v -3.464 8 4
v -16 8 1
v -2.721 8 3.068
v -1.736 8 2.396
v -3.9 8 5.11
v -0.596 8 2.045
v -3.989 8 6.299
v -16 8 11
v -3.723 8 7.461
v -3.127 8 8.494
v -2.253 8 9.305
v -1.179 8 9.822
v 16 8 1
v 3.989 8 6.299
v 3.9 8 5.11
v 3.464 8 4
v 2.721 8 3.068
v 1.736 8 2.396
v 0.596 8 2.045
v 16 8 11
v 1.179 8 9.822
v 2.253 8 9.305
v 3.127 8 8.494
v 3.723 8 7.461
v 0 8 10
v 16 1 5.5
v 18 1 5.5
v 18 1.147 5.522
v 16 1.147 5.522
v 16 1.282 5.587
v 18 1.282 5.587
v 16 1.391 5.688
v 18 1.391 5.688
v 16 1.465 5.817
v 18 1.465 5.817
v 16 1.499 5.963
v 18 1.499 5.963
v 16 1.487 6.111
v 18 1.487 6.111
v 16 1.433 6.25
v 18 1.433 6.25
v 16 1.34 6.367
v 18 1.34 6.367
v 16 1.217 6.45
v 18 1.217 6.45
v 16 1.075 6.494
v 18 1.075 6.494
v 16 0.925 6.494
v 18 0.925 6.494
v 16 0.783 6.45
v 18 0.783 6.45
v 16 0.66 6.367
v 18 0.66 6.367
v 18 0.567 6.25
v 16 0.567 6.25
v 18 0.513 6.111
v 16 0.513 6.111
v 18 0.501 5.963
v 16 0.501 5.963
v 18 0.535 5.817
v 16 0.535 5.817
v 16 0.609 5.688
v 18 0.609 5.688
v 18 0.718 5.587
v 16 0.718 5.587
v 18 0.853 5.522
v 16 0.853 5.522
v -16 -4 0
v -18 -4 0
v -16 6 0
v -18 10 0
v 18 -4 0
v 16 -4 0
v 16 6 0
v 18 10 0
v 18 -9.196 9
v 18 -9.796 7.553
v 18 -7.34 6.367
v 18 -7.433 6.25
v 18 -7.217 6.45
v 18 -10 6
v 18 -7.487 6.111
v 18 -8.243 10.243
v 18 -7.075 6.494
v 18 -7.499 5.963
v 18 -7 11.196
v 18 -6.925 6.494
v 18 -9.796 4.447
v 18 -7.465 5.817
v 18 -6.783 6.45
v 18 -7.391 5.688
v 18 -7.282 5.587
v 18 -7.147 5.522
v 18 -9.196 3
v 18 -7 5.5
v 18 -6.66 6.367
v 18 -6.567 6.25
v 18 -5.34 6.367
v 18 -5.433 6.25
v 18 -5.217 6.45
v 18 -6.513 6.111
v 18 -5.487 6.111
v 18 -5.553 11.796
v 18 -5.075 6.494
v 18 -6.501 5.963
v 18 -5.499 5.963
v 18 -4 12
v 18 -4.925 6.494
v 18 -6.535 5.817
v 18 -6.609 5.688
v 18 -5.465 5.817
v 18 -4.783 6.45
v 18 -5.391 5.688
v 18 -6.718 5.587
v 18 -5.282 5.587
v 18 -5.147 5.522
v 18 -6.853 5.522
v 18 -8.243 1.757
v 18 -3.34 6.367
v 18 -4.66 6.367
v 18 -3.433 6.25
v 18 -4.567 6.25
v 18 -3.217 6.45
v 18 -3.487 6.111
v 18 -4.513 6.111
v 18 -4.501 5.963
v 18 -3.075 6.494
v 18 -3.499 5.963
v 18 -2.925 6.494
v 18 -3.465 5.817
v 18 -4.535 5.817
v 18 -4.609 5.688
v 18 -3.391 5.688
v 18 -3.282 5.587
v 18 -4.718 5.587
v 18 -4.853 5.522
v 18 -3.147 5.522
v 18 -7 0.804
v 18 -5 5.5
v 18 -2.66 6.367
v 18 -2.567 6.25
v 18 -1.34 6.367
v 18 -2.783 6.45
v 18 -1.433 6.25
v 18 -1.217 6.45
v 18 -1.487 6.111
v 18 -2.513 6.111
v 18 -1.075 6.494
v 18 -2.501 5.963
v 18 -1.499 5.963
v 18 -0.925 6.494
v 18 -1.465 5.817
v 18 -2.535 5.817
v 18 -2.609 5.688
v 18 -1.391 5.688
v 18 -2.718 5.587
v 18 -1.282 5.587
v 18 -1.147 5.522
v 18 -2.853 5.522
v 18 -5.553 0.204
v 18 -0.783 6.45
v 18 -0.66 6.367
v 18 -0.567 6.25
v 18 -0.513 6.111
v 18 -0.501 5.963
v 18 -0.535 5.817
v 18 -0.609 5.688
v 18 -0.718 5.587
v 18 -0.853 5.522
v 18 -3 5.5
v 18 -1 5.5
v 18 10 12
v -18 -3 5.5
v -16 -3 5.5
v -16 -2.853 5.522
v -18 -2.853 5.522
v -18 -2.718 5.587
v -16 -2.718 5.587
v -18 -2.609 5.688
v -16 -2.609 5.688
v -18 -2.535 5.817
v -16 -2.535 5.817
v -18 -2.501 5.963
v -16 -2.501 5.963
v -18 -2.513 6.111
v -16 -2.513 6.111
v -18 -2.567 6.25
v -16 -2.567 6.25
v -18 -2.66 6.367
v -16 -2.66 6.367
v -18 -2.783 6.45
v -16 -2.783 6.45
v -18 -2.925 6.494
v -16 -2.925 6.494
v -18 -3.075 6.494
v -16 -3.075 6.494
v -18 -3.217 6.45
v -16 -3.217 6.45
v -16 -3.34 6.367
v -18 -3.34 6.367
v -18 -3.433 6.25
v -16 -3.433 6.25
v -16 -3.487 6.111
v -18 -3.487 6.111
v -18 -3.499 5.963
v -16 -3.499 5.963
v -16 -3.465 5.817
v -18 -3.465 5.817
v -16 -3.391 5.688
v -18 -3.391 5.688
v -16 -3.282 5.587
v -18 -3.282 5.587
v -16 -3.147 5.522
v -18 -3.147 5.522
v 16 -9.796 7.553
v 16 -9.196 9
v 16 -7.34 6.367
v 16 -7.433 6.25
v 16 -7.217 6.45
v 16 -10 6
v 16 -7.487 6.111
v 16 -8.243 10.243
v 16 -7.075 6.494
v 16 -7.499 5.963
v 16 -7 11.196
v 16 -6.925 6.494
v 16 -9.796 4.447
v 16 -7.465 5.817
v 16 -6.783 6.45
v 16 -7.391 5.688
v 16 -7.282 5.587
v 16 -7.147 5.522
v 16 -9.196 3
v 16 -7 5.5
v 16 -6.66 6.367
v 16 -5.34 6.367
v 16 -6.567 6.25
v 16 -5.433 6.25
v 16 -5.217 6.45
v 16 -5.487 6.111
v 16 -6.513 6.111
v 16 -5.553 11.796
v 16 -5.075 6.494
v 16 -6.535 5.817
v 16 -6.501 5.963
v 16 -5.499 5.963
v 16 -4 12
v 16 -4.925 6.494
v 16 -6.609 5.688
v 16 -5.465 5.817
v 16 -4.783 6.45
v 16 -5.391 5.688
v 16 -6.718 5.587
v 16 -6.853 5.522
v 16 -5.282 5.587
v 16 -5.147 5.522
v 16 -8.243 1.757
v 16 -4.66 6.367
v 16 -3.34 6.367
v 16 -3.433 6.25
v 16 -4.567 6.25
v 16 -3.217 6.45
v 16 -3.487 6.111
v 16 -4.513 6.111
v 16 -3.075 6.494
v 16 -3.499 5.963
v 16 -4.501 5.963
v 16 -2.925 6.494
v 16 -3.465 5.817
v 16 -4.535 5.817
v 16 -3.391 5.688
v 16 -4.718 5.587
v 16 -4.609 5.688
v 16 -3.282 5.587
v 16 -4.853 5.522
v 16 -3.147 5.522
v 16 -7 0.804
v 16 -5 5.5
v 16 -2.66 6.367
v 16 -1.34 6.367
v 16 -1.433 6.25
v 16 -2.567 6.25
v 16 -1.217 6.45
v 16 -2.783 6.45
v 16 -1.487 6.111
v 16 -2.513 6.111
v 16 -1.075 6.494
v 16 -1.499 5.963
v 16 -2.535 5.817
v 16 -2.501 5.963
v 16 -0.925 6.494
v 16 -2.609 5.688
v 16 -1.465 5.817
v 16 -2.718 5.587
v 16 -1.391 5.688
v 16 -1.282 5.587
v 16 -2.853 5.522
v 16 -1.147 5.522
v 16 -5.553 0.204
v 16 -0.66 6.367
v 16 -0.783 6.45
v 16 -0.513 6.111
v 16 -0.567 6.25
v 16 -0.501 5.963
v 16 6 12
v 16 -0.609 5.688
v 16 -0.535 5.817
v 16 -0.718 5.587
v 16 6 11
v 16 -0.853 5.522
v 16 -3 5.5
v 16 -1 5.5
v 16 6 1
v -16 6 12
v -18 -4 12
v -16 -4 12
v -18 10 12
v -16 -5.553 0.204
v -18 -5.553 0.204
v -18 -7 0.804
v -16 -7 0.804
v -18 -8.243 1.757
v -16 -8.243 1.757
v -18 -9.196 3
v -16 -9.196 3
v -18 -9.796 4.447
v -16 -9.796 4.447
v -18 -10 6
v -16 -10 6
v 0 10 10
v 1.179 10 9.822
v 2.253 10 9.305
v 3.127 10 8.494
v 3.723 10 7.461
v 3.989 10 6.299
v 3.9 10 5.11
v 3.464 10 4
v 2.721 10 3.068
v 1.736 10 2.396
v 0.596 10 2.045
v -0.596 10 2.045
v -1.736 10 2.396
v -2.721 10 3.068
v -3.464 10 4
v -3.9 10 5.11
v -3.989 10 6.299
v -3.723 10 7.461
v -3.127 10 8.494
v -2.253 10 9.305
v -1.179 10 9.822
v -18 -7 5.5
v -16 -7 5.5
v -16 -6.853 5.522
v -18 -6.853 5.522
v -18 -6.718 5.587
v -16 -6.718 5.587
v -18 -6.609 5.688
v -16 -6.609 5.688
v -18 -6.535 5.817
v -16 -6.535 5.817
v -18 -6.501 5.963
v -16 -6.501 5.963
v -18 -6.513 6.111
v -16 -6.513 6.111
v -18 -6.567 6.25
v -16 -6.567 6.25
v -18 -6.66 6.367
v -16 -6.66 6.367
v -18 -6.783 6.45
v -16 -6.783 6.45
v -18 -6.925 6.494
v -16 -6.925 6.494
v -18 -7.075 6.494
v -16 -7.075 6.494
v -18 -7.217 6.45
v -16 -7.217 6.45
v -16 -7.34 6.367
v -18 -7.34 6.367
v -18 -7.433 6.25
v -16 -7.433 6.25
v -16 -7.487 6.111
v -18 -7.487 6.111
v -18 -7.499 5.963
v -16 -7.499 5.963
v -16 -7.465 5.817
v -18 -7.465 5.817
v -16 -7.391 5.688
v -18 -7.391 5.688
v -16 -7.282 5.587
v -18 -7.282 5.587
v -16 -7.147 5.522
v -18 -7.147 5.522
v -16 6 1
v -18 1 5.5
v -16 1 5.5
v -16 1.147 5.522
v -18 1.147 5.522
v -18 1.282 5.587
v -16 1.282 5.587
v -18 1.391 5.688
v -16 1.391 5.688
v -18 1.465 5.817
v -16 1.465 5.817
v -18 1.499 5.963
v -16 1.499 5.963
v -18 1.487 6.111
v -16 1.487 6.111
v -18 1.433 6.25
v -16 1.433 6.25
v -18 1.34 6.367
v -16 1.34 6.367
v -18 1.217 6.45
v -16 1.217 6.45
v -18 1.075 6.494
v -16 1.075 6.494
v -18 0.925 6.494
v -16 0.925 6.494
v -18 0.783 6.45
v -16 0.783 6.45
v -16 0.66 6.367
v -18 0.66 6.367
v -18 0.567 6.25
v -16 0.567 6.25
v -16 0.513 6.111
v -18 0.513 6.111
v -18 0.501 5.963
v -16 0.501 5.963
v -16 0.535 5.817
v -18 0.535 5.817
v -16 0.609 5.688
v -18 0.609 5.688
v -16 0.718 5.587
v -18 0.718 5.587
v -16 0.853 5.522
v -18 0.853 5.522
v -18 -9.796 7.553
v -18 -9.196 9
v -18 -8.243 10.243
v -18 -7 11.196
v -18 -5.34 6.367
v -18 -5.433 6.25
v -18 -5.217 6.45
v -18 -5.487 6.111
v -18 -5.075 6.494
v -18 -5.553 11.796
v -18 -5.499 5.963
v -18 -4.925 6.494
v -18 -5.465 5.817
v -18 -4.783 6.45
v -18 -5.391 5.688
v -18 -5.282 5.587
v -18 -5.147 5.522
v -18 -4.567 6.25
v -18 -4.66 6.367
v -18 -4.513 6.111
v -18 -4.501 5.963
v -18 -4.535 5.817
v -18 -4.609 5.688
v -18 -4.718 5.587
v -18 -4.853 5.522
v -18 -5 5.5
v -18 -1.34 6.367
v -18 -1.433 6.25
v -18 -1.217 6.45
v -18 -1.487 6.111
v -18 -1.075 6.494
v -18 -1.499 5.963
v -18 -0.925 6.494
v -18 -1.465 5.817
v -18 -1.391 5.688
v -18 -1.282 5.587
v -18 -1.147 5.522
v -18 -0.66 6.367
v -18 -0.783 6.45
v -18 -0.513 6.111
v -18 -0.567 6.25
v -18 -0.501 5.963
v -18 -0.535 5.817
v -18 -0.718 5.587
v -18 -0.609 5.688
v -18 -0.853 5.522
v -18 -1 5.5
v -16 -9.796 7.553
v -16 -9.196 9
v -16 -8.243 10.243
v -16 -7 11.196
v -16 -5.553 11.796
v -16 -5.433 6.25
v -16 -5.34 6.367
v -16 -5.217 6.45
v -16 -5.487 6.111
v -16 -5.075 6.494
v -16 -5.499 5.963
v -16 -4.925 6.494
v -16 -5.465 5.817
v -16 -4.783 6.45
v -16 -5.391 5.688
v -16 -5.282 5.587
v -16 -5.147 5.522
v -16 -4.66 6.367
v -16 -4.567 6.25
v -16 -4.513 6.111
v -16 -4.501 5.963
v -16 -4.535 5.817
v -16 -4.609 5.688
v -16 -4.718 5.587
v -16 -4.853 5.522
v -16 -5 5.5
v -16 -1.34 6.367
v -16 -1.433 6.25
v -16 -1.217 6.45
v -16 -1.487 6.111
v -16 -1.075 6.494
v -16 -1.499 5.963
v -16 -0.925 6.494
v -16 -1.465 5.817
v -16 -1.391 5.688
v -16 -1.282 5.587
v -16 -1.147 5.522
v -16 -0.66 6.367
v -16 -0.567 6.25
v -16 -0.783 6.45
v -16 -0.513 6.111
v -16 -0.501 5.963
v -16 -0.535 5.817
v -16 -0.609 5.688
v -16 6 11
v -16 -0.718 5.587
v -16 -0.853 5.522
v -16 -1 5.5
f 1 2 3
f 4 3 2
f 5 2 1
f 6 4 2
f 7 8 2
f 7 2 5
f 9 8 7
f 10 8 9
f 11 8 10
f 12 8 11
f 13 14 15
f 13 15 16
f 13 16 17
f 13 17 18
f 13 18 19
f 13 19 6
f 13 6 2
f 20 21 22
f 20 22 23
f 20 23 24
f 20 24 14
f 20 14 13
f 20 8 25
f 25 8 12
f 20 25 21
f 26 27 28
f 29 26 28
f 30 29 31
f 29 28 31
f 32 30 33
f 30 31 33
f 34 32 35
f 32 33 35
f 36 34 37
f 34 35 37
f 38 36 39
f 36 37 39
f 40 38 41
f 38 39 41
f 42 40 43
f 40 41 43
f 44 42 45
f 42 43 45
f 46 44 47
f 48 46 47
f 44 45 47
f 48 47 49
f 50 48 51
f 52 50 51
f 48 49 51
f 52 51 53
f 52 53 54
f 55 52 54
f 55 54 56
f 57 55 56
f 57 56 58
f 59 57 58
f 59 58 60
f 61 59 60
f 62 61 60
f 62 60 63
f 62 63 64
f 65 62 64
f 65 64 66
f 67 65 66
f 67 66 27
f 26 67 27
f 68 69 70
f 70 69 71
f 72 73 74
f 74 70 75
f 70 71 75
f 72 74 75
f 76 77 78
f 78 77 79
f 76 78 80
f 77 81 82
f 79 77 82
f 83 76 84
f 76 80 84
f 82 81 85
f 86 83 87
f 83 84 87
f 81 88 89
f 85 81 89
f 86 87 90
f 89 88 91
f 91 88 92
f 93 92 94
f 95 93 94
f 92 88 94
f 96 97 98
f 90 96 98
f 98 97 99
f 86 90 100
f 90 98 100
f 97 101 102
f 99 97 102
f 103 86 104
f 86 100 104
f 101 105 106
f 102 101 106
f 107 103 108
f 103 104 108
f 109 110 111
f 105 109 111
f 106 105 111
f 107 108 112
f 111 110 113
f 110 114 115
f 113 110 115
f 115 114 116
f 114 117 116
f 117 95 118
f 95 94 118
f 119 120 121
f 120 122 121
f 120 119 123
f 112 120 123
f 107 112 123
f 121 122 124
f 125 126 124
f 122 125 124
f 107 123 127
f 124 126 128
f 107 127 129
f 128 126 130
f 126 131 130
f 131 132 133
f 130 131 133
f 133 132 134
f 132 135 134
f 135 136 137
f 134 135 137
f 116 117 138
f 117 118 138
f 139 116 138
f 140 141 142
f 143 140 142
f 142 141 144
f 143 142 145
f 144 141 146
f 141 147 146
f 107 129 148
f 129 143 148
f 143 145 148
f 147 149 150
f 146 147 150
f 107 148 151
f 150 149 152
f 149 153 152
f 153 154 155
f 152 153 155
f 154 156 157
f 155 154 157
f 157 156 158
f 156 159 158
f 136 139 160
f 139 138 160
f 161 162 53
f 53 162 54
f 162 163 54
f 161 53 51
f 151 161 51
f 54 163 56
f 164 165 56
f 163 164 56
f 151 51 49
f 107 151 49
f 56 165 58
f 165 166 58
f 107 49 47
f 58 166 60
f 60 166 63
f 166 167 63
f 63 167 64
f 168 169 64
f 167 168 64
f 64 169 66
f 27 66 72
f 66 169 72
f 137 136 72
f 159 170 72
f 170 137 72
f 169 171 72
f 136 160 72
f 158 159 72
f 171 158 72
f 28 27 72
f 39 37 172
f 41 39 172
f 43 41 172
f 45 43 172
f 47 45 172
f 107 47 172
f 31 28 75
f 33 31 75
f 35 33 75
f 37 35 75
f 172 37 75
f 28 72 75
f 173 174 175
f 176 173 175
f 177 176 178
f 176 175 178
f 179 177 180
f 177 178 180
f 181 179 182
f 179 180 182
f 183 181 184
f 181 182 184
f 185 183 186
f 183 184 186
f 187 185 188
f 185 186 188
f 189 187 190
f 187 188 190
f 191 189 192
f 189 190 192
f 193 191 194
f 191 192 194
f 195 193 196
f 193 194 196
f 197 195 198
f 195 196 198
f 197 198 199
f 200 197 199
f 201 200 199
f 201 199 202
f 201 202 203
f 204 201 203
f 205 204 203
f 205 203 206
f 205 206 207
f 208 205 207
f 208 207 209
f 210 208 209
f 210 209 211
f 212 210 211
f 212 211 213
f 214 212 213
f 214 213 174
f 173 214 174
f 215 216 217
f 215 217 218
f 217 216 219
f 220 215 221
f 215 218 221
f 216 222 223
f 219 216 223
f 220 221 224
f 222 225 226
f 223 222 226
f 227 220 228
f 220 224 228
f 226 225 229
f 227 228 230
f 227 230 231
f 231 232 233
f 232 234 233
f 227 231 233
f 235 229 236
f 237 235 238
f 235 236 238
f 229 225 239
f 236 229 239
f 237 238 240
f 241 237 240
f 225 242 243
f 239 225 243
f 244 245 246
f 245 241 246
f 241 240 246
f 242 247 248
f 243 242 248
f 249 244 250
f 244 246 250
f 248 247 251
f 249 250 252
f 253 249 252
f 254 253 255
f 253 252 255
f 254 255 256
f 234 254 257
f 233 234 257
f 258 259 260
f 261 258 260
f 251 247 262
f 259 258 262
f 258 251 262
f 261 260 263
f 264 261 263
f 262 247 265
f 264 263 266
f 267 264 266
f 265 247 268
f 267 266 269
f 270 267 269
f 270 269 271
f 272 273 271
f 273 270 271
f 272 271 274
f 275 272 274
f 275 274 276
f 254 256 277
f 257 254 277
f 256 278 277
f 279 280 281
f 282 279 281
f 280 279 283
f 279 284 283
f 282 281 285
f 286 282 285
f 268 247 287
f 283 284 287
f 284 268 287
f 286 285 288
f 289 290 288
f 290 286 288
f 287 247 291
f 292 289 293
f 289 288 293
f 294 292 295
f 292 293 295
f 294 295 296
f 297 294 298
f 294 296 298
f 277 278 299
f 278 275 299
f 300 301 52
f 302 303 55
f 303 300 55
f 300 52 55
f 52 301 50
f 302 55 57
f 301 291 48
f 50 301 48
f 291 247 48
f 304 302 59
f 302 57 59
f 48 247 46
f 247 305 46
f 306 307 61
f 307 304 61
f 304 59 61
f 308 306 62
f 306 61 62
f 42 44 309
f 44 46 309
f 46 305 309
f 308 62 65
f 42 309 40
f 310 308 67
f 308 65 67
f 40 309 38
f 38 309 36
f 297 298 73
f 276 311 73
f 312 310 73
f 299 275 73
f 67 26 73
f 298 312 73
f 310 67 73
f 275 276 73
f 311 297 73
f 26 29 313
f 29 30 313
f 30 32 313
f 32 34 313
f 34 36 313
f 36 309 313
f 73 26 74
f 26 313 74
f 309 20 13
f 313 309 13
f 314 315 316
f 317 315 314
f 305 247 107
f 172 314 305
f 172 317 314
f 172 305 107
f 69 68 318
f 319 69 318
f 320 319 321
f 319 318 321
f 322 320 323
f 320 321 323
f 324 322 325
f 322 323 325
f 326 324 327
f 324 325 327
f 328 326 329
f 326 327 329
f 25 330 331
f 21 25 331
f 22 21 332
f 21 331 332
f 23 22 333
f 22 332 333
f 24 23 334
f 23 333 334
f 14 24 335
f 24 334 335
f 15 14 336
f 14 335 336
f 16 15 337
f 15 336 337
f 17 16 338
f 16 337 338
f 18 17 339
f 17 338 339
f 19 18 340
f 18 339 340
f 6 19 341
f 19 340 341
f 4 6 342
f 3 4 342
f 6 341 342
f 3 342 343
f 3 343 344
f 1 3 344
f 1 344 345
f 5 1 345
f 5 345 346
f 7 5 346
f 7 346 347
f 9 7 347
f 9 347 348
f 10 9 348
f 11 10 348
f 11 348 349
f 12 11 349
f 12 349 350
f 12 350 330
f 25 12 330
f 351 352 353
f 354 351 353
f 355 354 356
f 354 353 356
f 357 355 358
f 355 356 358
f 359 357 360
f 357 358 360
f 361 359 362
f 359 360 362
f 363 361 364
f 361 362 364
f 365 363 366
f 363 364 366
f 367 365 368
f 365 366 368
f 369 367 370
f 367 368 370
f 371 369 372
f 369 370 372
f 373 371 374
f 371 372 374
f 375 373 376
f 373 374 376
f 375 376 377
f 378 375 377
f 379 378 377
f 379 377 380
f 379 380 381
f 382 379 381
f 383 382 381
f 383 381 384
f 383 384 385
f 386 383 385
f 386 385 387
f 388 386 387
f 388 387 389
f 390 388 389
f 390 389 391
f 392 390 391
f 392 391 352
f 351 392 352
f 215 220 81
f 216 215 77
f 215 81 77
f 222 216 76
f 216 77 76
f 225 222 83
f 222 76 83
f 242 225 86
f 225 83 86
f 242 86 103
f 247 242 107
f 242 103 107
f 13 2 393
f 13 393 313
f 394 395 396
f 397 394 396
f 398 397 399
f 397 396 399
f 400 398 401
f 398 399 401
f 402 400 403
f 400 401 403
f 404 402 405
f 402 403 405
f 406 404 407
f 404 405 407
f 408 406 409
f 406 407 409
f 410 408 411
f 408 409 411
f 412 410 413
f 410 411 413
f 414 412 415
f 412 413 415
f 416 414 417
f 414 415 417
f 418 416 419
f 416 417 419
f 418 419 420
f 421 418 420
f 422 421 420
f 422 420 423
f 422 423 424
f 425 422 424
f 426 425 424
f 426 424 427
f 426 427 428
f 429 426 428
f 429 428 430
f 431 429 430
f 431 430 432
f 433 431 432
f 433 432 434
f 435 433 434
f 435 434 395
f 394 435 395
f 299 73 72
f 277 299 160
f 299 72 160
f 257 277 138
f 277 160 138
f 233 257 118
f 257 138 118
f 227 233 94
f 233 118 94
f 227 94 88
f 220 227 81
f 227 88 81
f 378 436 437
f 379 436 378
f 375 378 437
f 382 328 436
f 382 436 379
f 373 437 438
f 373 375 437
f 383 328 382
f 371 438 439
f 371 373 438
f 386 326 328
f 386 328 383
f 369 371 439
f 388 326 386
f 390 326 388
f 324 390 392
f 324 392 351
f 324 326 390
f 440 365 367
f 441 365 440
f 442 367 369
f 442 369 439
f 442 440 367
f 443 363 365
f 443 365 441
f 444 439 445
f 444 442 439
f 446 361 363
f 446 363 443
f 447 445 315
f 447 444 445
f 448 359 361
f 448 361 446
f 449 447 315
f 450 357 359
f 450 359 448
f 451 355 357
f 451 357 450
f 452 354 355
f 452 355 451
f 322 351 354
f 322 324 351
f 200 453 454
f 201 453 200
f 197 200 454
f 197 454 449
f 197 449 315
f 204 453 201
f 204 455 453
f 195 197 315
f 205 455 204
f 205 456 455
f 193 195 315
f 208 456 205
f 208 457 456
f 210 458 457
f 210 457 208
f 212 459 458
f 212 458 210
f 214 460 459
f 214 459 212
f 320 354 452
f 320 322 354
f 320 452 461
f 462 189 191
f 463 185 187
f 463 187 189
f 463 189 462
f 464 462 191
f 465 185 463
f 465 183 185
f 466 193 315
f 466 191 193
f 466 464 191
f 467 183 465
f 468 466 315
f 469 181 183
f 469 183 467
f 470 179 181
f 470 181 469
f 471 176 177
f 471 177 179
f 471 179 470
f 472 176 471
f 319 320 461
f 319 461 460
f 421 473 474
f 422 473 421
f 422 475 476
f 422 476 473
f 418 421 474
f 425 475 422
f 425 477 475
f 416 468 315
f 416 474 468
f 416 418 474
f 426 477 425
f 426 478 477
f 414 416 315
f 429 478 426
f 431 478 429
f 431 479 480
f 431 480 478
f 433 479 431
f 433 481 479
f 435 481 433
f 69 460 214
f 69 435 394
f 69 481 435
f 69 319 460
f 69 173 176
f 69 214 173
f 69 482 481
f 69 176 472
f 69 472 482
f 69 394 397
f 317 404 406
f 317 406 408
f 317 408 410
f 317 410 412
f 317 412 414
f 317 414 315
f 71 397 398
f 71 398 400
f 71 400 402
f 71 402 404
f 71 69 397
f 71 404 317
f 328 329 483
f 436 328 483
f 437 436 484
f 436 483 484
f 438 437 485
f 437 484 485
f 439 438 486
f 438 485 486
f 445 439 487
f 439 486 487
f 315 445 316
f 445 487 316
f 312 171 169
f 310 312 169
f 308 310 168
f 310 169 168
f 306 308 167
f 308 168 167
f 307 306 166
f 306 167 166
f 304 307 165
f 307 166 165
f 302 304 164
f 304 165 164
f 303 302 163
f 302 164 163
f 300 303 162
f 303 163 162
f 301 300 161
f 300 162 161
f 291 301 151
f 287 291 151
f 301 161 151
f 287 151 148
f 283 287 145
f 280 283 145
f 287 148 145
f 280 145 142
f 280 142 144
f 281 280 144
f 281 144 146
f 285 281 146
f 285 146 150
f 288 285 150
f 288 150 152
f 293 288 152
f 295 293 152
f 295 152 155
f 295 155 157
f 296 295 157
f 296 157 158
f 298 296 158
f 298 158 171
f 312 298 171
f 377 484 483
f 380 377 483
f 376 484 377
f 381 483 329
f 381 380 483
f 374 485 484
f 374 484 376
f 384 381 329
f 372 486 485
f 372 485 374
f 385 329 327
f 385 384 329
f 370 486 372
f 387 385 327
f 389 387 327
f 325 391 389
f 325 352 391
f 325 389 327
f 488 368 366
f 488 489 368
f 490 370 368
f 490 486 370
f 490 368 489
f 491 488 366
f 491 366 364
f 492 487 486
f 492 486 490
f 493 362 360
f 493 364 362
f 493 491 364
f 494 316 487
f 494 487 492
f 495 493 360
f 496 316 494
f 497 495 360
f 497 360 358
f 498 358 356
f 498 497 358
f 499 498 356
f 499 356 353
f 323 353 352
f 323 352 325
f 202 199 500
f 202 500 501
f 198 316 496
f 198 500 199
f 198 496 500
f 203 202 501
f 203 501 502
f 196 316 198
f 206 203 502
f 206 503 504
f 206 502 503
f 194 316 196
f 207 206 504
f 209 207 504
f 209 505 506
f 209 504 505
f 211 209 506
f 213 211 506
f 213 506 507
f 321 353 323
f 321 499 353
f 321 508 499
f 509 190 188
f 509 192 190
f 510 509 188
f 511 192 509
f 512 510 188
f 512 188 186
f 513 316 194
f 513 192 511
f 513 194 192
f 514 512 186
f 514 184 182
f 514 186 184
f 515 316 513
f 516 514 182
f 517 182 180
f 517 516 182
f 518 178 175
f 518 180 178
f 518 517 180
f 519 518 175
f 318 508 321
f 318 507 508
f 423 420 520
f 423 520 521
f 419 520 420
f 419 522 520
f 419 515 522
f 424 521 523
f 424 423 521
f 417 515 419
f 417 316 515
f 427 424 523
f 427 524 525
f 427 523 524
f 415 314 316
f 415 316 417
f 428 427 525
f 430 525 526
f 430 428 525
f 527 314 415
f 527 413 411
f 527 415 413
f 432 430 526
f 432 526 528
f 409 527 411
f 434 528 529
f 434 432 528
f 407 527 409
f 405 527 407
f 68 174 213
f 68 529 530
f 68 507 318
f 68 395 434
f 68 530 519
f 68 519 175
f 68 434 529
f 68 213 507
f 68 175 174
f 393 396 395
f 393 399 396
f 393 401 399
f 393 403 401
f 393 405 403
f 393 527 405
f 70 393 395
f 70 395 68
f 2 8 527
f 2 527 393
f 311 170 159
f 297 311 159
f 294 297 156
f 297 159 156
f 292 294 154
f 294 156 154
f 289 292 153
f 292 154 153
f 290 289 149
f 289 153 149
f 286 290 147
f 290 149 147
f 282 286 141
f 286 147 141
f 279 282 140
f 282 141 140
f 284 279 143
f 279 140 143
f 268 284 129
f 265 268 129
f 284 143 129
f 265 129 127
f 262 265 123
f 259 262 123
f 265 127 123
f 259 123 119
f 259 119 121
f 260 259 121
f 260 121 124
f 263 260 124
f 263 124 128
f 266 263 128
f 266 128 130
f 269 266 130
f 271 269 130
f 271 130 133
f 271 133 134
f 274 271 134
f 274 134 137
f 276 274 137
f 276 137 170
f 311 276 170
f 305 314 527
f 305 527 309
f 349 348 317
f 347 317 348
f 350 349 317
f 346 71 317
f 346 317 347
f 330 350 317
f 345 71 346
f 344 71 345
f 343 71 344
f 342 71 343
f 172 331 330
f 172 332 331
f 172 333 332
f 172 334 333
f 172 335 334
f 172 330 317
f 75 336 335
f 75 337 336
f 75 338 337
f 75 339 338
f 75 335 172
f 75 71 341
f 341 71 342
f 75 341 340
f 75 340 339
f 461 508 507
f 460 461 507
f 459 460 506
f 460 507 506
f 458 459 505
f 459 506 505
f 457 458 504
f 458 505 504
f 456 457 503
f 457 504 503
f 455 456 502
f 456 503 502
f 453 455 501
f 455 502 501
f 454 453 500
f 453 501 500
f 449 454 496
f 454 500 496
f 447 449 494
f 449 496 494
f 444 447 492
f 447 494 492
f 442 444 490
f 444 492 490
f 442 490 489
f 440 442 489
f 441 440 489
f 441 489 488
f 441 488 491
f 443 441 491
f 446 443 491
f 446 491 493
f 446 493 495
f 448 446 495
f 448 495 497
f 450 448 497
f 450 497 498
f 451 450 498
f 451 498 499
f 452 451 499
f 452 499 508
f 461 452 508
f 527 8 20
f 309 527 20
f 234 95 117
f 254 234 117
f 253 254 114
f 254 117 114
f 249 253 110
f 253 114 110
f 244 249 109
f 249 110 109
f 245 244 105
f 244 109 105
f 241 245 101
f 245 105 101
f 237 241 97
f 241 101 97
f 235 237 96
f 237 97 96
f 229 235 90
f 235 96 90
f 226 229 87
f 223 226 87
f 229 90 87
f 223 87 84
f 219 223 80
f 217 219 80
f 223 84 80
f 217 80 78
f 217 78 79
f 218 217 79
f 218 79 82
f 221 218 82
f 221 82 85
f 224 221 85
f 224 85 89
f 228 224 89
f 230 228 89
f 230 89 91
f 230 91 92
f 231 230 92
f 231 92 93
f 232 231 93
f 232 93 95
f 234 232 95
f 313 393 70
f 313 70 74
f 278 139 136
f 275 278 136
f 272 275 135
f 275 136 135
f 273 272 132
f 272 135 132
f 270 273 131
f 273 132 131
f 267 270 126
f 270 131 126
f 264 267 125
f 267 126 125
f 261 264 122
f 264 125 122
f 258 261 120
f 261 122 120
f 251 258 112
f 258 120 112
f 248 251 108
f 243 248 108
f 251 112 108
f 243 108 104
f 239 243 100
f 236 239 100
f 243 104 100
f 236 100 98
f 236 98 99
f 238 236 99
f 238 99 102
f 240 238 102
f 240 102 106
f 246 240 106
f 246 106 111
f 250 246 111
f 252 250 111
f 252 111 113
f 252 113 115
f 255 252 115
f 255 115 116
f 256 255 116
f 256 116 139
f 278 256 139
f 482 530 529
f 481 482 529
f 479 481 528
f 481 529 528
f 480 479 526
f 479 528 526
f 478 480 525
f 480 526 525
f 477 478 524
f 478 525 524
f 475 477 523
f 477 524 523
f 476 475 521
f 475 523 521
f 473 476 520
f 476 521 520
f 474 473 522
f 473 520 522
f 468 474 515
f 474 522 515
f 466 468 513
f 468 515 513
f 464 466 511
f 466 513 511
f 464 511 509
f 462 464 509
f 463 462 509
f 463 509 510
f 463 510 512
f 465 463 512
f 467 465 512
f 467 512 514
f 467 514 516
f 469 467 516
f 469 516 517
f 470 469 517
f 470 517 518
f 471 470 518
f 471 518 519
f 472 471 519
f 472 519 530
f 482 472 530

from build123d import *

# Parameters (mm, degrees)
SKETCH1_W           = 36
SKETCH1_H           = 20
BOSS_EXTRUDE1_DEPTH = 12
SKETCH3_W           = 32
SKETCH3_H           = 16
CUT_EXTRUDE1_DEPTH  = 12
SKETCH4_W           = 32
SKETCH4_H           = 12
CUT_EXTRUDE2_DEPTH  = 12
CUT_EXTRUDE3_DEPTH  = 40.242833741
SKETCH5_R           = 4
CUT_EXTRUDE4_DEPTH  = 10
SKETCH6_R           = 0.5
CUT_EXTRUDE5_DEPTH  = 40.242833741
SKETCH7_W           = 32
SKETCH7_H           = 1
BOSS_EXTRUDE2_DEPTH = 2


with BuildPart() as part:
    # Sketch1 → Boss-Extrude1 (new body)
    with BuildSketch(Plane.XY):
        Rectangle(SKETCH1_W, SKETCH1_H)
    extrude(amount=BOSS_EXTRUDE1_DEPTH)

    # Sketch3 → Cut-Extrude1 (cut)
    with BuildSketch(Plane.XY.offset(12)):
        Rectangle(SKETCH3_W, SKETCH3_H)
    extrude(amount=-CUT_EXTRUDE1_DEPTH, mode=Mode.SUBTRACT)

    # Sketch4 → Cut-Extrude2 (cut)
    with BuildSketch(Plane(origin=(0, -8, 0), x_dir=(1, 0, 0), z_dir=(0, 1, 0))):
        with Locations((0, -6)):
            Rectangle(SKETCH4_W, SKETCH4_H)
    extrude(amount=-CUT_EXTRUDE2_DEPTH, mode=Mode.SUBTRACT)

    # Sketch2 → Cut-Extrude3 (cut, through all)
    with BuildSketch(Plane(origin=(18, 0, 0), x_dir=(0, 0, -1), z_dir=(1, 0, 0))):
        with BuildLine():
            Line((-12, -10), (-6, -10))
            ThreePointArc((-6, -10), (-10.242640687, -8.242640687), (-12, -4))
            Line((-12, -4), (-12, -10))
        make_face()
        with BuildLine():
            Line((-6, -10), (0, -10))
            Line((0, -10), (0, -4))
            ThreePointArc((0, -4), (-1.757359313, -8.242640687), (-6, -10))
        make_face()
    extrude(amount=-CUT_EXTRUDE3_DEPTH, mode=Mode.SUBTRACT)

    # Sketch5 → Cut-Extrude4 (cut)
    with BuildSketch(Plane(origin=(0, 10, 0), x_dir=(1, 0, 0), z_dir=(0, 1, 0))):
        with Locations(Location((0, -6, 0), (0, 0, 270))):
            Circle(SKETCH5_R)
    extrude(amount=-CUT_EXTRUDE4_DEPTH, mode=Mode.SUBTRACT)

    # Sketch6 → Cut-Extrude5 (cut, through all)
    with BuildSketch(Plane(origin=(18, 0, 0), x_dir=(0, 0, -1), z_dir=(1, 0, 0))):
        with Locations((-6, -7)):
            Circle(SKETCH6_R)
        with Locations((-6, -5)):
            Circle(SKETCH6_R)
        with Locations((-6, -3)):
            Circle(SKETCH6_R)
        with Locations((-6, -1)):
            Circle(SKETCH6_R)
        with Locations((-6, 1)):
            Circle(SKETCH6_R)
    extrude(amount=-CUT_EXTRUDE5_DEPTH, mode=Mode.SUBTRACT)

    # Sketch7 → Boss-Extrude2 (add)
    with BuildSketch(Plane.XZ.offset(-8)):
        with Locations((0, 11.5)):
            Rectangle(SKETCH7_W, SKETCH7_H)
        with Locations((0, 0.5)):
            Rectangle(SKETCH7_W, SKETCH7_H)
    extrude(amount=BOSS_EXTRUDE2_DEPTH)


solid = part.part
